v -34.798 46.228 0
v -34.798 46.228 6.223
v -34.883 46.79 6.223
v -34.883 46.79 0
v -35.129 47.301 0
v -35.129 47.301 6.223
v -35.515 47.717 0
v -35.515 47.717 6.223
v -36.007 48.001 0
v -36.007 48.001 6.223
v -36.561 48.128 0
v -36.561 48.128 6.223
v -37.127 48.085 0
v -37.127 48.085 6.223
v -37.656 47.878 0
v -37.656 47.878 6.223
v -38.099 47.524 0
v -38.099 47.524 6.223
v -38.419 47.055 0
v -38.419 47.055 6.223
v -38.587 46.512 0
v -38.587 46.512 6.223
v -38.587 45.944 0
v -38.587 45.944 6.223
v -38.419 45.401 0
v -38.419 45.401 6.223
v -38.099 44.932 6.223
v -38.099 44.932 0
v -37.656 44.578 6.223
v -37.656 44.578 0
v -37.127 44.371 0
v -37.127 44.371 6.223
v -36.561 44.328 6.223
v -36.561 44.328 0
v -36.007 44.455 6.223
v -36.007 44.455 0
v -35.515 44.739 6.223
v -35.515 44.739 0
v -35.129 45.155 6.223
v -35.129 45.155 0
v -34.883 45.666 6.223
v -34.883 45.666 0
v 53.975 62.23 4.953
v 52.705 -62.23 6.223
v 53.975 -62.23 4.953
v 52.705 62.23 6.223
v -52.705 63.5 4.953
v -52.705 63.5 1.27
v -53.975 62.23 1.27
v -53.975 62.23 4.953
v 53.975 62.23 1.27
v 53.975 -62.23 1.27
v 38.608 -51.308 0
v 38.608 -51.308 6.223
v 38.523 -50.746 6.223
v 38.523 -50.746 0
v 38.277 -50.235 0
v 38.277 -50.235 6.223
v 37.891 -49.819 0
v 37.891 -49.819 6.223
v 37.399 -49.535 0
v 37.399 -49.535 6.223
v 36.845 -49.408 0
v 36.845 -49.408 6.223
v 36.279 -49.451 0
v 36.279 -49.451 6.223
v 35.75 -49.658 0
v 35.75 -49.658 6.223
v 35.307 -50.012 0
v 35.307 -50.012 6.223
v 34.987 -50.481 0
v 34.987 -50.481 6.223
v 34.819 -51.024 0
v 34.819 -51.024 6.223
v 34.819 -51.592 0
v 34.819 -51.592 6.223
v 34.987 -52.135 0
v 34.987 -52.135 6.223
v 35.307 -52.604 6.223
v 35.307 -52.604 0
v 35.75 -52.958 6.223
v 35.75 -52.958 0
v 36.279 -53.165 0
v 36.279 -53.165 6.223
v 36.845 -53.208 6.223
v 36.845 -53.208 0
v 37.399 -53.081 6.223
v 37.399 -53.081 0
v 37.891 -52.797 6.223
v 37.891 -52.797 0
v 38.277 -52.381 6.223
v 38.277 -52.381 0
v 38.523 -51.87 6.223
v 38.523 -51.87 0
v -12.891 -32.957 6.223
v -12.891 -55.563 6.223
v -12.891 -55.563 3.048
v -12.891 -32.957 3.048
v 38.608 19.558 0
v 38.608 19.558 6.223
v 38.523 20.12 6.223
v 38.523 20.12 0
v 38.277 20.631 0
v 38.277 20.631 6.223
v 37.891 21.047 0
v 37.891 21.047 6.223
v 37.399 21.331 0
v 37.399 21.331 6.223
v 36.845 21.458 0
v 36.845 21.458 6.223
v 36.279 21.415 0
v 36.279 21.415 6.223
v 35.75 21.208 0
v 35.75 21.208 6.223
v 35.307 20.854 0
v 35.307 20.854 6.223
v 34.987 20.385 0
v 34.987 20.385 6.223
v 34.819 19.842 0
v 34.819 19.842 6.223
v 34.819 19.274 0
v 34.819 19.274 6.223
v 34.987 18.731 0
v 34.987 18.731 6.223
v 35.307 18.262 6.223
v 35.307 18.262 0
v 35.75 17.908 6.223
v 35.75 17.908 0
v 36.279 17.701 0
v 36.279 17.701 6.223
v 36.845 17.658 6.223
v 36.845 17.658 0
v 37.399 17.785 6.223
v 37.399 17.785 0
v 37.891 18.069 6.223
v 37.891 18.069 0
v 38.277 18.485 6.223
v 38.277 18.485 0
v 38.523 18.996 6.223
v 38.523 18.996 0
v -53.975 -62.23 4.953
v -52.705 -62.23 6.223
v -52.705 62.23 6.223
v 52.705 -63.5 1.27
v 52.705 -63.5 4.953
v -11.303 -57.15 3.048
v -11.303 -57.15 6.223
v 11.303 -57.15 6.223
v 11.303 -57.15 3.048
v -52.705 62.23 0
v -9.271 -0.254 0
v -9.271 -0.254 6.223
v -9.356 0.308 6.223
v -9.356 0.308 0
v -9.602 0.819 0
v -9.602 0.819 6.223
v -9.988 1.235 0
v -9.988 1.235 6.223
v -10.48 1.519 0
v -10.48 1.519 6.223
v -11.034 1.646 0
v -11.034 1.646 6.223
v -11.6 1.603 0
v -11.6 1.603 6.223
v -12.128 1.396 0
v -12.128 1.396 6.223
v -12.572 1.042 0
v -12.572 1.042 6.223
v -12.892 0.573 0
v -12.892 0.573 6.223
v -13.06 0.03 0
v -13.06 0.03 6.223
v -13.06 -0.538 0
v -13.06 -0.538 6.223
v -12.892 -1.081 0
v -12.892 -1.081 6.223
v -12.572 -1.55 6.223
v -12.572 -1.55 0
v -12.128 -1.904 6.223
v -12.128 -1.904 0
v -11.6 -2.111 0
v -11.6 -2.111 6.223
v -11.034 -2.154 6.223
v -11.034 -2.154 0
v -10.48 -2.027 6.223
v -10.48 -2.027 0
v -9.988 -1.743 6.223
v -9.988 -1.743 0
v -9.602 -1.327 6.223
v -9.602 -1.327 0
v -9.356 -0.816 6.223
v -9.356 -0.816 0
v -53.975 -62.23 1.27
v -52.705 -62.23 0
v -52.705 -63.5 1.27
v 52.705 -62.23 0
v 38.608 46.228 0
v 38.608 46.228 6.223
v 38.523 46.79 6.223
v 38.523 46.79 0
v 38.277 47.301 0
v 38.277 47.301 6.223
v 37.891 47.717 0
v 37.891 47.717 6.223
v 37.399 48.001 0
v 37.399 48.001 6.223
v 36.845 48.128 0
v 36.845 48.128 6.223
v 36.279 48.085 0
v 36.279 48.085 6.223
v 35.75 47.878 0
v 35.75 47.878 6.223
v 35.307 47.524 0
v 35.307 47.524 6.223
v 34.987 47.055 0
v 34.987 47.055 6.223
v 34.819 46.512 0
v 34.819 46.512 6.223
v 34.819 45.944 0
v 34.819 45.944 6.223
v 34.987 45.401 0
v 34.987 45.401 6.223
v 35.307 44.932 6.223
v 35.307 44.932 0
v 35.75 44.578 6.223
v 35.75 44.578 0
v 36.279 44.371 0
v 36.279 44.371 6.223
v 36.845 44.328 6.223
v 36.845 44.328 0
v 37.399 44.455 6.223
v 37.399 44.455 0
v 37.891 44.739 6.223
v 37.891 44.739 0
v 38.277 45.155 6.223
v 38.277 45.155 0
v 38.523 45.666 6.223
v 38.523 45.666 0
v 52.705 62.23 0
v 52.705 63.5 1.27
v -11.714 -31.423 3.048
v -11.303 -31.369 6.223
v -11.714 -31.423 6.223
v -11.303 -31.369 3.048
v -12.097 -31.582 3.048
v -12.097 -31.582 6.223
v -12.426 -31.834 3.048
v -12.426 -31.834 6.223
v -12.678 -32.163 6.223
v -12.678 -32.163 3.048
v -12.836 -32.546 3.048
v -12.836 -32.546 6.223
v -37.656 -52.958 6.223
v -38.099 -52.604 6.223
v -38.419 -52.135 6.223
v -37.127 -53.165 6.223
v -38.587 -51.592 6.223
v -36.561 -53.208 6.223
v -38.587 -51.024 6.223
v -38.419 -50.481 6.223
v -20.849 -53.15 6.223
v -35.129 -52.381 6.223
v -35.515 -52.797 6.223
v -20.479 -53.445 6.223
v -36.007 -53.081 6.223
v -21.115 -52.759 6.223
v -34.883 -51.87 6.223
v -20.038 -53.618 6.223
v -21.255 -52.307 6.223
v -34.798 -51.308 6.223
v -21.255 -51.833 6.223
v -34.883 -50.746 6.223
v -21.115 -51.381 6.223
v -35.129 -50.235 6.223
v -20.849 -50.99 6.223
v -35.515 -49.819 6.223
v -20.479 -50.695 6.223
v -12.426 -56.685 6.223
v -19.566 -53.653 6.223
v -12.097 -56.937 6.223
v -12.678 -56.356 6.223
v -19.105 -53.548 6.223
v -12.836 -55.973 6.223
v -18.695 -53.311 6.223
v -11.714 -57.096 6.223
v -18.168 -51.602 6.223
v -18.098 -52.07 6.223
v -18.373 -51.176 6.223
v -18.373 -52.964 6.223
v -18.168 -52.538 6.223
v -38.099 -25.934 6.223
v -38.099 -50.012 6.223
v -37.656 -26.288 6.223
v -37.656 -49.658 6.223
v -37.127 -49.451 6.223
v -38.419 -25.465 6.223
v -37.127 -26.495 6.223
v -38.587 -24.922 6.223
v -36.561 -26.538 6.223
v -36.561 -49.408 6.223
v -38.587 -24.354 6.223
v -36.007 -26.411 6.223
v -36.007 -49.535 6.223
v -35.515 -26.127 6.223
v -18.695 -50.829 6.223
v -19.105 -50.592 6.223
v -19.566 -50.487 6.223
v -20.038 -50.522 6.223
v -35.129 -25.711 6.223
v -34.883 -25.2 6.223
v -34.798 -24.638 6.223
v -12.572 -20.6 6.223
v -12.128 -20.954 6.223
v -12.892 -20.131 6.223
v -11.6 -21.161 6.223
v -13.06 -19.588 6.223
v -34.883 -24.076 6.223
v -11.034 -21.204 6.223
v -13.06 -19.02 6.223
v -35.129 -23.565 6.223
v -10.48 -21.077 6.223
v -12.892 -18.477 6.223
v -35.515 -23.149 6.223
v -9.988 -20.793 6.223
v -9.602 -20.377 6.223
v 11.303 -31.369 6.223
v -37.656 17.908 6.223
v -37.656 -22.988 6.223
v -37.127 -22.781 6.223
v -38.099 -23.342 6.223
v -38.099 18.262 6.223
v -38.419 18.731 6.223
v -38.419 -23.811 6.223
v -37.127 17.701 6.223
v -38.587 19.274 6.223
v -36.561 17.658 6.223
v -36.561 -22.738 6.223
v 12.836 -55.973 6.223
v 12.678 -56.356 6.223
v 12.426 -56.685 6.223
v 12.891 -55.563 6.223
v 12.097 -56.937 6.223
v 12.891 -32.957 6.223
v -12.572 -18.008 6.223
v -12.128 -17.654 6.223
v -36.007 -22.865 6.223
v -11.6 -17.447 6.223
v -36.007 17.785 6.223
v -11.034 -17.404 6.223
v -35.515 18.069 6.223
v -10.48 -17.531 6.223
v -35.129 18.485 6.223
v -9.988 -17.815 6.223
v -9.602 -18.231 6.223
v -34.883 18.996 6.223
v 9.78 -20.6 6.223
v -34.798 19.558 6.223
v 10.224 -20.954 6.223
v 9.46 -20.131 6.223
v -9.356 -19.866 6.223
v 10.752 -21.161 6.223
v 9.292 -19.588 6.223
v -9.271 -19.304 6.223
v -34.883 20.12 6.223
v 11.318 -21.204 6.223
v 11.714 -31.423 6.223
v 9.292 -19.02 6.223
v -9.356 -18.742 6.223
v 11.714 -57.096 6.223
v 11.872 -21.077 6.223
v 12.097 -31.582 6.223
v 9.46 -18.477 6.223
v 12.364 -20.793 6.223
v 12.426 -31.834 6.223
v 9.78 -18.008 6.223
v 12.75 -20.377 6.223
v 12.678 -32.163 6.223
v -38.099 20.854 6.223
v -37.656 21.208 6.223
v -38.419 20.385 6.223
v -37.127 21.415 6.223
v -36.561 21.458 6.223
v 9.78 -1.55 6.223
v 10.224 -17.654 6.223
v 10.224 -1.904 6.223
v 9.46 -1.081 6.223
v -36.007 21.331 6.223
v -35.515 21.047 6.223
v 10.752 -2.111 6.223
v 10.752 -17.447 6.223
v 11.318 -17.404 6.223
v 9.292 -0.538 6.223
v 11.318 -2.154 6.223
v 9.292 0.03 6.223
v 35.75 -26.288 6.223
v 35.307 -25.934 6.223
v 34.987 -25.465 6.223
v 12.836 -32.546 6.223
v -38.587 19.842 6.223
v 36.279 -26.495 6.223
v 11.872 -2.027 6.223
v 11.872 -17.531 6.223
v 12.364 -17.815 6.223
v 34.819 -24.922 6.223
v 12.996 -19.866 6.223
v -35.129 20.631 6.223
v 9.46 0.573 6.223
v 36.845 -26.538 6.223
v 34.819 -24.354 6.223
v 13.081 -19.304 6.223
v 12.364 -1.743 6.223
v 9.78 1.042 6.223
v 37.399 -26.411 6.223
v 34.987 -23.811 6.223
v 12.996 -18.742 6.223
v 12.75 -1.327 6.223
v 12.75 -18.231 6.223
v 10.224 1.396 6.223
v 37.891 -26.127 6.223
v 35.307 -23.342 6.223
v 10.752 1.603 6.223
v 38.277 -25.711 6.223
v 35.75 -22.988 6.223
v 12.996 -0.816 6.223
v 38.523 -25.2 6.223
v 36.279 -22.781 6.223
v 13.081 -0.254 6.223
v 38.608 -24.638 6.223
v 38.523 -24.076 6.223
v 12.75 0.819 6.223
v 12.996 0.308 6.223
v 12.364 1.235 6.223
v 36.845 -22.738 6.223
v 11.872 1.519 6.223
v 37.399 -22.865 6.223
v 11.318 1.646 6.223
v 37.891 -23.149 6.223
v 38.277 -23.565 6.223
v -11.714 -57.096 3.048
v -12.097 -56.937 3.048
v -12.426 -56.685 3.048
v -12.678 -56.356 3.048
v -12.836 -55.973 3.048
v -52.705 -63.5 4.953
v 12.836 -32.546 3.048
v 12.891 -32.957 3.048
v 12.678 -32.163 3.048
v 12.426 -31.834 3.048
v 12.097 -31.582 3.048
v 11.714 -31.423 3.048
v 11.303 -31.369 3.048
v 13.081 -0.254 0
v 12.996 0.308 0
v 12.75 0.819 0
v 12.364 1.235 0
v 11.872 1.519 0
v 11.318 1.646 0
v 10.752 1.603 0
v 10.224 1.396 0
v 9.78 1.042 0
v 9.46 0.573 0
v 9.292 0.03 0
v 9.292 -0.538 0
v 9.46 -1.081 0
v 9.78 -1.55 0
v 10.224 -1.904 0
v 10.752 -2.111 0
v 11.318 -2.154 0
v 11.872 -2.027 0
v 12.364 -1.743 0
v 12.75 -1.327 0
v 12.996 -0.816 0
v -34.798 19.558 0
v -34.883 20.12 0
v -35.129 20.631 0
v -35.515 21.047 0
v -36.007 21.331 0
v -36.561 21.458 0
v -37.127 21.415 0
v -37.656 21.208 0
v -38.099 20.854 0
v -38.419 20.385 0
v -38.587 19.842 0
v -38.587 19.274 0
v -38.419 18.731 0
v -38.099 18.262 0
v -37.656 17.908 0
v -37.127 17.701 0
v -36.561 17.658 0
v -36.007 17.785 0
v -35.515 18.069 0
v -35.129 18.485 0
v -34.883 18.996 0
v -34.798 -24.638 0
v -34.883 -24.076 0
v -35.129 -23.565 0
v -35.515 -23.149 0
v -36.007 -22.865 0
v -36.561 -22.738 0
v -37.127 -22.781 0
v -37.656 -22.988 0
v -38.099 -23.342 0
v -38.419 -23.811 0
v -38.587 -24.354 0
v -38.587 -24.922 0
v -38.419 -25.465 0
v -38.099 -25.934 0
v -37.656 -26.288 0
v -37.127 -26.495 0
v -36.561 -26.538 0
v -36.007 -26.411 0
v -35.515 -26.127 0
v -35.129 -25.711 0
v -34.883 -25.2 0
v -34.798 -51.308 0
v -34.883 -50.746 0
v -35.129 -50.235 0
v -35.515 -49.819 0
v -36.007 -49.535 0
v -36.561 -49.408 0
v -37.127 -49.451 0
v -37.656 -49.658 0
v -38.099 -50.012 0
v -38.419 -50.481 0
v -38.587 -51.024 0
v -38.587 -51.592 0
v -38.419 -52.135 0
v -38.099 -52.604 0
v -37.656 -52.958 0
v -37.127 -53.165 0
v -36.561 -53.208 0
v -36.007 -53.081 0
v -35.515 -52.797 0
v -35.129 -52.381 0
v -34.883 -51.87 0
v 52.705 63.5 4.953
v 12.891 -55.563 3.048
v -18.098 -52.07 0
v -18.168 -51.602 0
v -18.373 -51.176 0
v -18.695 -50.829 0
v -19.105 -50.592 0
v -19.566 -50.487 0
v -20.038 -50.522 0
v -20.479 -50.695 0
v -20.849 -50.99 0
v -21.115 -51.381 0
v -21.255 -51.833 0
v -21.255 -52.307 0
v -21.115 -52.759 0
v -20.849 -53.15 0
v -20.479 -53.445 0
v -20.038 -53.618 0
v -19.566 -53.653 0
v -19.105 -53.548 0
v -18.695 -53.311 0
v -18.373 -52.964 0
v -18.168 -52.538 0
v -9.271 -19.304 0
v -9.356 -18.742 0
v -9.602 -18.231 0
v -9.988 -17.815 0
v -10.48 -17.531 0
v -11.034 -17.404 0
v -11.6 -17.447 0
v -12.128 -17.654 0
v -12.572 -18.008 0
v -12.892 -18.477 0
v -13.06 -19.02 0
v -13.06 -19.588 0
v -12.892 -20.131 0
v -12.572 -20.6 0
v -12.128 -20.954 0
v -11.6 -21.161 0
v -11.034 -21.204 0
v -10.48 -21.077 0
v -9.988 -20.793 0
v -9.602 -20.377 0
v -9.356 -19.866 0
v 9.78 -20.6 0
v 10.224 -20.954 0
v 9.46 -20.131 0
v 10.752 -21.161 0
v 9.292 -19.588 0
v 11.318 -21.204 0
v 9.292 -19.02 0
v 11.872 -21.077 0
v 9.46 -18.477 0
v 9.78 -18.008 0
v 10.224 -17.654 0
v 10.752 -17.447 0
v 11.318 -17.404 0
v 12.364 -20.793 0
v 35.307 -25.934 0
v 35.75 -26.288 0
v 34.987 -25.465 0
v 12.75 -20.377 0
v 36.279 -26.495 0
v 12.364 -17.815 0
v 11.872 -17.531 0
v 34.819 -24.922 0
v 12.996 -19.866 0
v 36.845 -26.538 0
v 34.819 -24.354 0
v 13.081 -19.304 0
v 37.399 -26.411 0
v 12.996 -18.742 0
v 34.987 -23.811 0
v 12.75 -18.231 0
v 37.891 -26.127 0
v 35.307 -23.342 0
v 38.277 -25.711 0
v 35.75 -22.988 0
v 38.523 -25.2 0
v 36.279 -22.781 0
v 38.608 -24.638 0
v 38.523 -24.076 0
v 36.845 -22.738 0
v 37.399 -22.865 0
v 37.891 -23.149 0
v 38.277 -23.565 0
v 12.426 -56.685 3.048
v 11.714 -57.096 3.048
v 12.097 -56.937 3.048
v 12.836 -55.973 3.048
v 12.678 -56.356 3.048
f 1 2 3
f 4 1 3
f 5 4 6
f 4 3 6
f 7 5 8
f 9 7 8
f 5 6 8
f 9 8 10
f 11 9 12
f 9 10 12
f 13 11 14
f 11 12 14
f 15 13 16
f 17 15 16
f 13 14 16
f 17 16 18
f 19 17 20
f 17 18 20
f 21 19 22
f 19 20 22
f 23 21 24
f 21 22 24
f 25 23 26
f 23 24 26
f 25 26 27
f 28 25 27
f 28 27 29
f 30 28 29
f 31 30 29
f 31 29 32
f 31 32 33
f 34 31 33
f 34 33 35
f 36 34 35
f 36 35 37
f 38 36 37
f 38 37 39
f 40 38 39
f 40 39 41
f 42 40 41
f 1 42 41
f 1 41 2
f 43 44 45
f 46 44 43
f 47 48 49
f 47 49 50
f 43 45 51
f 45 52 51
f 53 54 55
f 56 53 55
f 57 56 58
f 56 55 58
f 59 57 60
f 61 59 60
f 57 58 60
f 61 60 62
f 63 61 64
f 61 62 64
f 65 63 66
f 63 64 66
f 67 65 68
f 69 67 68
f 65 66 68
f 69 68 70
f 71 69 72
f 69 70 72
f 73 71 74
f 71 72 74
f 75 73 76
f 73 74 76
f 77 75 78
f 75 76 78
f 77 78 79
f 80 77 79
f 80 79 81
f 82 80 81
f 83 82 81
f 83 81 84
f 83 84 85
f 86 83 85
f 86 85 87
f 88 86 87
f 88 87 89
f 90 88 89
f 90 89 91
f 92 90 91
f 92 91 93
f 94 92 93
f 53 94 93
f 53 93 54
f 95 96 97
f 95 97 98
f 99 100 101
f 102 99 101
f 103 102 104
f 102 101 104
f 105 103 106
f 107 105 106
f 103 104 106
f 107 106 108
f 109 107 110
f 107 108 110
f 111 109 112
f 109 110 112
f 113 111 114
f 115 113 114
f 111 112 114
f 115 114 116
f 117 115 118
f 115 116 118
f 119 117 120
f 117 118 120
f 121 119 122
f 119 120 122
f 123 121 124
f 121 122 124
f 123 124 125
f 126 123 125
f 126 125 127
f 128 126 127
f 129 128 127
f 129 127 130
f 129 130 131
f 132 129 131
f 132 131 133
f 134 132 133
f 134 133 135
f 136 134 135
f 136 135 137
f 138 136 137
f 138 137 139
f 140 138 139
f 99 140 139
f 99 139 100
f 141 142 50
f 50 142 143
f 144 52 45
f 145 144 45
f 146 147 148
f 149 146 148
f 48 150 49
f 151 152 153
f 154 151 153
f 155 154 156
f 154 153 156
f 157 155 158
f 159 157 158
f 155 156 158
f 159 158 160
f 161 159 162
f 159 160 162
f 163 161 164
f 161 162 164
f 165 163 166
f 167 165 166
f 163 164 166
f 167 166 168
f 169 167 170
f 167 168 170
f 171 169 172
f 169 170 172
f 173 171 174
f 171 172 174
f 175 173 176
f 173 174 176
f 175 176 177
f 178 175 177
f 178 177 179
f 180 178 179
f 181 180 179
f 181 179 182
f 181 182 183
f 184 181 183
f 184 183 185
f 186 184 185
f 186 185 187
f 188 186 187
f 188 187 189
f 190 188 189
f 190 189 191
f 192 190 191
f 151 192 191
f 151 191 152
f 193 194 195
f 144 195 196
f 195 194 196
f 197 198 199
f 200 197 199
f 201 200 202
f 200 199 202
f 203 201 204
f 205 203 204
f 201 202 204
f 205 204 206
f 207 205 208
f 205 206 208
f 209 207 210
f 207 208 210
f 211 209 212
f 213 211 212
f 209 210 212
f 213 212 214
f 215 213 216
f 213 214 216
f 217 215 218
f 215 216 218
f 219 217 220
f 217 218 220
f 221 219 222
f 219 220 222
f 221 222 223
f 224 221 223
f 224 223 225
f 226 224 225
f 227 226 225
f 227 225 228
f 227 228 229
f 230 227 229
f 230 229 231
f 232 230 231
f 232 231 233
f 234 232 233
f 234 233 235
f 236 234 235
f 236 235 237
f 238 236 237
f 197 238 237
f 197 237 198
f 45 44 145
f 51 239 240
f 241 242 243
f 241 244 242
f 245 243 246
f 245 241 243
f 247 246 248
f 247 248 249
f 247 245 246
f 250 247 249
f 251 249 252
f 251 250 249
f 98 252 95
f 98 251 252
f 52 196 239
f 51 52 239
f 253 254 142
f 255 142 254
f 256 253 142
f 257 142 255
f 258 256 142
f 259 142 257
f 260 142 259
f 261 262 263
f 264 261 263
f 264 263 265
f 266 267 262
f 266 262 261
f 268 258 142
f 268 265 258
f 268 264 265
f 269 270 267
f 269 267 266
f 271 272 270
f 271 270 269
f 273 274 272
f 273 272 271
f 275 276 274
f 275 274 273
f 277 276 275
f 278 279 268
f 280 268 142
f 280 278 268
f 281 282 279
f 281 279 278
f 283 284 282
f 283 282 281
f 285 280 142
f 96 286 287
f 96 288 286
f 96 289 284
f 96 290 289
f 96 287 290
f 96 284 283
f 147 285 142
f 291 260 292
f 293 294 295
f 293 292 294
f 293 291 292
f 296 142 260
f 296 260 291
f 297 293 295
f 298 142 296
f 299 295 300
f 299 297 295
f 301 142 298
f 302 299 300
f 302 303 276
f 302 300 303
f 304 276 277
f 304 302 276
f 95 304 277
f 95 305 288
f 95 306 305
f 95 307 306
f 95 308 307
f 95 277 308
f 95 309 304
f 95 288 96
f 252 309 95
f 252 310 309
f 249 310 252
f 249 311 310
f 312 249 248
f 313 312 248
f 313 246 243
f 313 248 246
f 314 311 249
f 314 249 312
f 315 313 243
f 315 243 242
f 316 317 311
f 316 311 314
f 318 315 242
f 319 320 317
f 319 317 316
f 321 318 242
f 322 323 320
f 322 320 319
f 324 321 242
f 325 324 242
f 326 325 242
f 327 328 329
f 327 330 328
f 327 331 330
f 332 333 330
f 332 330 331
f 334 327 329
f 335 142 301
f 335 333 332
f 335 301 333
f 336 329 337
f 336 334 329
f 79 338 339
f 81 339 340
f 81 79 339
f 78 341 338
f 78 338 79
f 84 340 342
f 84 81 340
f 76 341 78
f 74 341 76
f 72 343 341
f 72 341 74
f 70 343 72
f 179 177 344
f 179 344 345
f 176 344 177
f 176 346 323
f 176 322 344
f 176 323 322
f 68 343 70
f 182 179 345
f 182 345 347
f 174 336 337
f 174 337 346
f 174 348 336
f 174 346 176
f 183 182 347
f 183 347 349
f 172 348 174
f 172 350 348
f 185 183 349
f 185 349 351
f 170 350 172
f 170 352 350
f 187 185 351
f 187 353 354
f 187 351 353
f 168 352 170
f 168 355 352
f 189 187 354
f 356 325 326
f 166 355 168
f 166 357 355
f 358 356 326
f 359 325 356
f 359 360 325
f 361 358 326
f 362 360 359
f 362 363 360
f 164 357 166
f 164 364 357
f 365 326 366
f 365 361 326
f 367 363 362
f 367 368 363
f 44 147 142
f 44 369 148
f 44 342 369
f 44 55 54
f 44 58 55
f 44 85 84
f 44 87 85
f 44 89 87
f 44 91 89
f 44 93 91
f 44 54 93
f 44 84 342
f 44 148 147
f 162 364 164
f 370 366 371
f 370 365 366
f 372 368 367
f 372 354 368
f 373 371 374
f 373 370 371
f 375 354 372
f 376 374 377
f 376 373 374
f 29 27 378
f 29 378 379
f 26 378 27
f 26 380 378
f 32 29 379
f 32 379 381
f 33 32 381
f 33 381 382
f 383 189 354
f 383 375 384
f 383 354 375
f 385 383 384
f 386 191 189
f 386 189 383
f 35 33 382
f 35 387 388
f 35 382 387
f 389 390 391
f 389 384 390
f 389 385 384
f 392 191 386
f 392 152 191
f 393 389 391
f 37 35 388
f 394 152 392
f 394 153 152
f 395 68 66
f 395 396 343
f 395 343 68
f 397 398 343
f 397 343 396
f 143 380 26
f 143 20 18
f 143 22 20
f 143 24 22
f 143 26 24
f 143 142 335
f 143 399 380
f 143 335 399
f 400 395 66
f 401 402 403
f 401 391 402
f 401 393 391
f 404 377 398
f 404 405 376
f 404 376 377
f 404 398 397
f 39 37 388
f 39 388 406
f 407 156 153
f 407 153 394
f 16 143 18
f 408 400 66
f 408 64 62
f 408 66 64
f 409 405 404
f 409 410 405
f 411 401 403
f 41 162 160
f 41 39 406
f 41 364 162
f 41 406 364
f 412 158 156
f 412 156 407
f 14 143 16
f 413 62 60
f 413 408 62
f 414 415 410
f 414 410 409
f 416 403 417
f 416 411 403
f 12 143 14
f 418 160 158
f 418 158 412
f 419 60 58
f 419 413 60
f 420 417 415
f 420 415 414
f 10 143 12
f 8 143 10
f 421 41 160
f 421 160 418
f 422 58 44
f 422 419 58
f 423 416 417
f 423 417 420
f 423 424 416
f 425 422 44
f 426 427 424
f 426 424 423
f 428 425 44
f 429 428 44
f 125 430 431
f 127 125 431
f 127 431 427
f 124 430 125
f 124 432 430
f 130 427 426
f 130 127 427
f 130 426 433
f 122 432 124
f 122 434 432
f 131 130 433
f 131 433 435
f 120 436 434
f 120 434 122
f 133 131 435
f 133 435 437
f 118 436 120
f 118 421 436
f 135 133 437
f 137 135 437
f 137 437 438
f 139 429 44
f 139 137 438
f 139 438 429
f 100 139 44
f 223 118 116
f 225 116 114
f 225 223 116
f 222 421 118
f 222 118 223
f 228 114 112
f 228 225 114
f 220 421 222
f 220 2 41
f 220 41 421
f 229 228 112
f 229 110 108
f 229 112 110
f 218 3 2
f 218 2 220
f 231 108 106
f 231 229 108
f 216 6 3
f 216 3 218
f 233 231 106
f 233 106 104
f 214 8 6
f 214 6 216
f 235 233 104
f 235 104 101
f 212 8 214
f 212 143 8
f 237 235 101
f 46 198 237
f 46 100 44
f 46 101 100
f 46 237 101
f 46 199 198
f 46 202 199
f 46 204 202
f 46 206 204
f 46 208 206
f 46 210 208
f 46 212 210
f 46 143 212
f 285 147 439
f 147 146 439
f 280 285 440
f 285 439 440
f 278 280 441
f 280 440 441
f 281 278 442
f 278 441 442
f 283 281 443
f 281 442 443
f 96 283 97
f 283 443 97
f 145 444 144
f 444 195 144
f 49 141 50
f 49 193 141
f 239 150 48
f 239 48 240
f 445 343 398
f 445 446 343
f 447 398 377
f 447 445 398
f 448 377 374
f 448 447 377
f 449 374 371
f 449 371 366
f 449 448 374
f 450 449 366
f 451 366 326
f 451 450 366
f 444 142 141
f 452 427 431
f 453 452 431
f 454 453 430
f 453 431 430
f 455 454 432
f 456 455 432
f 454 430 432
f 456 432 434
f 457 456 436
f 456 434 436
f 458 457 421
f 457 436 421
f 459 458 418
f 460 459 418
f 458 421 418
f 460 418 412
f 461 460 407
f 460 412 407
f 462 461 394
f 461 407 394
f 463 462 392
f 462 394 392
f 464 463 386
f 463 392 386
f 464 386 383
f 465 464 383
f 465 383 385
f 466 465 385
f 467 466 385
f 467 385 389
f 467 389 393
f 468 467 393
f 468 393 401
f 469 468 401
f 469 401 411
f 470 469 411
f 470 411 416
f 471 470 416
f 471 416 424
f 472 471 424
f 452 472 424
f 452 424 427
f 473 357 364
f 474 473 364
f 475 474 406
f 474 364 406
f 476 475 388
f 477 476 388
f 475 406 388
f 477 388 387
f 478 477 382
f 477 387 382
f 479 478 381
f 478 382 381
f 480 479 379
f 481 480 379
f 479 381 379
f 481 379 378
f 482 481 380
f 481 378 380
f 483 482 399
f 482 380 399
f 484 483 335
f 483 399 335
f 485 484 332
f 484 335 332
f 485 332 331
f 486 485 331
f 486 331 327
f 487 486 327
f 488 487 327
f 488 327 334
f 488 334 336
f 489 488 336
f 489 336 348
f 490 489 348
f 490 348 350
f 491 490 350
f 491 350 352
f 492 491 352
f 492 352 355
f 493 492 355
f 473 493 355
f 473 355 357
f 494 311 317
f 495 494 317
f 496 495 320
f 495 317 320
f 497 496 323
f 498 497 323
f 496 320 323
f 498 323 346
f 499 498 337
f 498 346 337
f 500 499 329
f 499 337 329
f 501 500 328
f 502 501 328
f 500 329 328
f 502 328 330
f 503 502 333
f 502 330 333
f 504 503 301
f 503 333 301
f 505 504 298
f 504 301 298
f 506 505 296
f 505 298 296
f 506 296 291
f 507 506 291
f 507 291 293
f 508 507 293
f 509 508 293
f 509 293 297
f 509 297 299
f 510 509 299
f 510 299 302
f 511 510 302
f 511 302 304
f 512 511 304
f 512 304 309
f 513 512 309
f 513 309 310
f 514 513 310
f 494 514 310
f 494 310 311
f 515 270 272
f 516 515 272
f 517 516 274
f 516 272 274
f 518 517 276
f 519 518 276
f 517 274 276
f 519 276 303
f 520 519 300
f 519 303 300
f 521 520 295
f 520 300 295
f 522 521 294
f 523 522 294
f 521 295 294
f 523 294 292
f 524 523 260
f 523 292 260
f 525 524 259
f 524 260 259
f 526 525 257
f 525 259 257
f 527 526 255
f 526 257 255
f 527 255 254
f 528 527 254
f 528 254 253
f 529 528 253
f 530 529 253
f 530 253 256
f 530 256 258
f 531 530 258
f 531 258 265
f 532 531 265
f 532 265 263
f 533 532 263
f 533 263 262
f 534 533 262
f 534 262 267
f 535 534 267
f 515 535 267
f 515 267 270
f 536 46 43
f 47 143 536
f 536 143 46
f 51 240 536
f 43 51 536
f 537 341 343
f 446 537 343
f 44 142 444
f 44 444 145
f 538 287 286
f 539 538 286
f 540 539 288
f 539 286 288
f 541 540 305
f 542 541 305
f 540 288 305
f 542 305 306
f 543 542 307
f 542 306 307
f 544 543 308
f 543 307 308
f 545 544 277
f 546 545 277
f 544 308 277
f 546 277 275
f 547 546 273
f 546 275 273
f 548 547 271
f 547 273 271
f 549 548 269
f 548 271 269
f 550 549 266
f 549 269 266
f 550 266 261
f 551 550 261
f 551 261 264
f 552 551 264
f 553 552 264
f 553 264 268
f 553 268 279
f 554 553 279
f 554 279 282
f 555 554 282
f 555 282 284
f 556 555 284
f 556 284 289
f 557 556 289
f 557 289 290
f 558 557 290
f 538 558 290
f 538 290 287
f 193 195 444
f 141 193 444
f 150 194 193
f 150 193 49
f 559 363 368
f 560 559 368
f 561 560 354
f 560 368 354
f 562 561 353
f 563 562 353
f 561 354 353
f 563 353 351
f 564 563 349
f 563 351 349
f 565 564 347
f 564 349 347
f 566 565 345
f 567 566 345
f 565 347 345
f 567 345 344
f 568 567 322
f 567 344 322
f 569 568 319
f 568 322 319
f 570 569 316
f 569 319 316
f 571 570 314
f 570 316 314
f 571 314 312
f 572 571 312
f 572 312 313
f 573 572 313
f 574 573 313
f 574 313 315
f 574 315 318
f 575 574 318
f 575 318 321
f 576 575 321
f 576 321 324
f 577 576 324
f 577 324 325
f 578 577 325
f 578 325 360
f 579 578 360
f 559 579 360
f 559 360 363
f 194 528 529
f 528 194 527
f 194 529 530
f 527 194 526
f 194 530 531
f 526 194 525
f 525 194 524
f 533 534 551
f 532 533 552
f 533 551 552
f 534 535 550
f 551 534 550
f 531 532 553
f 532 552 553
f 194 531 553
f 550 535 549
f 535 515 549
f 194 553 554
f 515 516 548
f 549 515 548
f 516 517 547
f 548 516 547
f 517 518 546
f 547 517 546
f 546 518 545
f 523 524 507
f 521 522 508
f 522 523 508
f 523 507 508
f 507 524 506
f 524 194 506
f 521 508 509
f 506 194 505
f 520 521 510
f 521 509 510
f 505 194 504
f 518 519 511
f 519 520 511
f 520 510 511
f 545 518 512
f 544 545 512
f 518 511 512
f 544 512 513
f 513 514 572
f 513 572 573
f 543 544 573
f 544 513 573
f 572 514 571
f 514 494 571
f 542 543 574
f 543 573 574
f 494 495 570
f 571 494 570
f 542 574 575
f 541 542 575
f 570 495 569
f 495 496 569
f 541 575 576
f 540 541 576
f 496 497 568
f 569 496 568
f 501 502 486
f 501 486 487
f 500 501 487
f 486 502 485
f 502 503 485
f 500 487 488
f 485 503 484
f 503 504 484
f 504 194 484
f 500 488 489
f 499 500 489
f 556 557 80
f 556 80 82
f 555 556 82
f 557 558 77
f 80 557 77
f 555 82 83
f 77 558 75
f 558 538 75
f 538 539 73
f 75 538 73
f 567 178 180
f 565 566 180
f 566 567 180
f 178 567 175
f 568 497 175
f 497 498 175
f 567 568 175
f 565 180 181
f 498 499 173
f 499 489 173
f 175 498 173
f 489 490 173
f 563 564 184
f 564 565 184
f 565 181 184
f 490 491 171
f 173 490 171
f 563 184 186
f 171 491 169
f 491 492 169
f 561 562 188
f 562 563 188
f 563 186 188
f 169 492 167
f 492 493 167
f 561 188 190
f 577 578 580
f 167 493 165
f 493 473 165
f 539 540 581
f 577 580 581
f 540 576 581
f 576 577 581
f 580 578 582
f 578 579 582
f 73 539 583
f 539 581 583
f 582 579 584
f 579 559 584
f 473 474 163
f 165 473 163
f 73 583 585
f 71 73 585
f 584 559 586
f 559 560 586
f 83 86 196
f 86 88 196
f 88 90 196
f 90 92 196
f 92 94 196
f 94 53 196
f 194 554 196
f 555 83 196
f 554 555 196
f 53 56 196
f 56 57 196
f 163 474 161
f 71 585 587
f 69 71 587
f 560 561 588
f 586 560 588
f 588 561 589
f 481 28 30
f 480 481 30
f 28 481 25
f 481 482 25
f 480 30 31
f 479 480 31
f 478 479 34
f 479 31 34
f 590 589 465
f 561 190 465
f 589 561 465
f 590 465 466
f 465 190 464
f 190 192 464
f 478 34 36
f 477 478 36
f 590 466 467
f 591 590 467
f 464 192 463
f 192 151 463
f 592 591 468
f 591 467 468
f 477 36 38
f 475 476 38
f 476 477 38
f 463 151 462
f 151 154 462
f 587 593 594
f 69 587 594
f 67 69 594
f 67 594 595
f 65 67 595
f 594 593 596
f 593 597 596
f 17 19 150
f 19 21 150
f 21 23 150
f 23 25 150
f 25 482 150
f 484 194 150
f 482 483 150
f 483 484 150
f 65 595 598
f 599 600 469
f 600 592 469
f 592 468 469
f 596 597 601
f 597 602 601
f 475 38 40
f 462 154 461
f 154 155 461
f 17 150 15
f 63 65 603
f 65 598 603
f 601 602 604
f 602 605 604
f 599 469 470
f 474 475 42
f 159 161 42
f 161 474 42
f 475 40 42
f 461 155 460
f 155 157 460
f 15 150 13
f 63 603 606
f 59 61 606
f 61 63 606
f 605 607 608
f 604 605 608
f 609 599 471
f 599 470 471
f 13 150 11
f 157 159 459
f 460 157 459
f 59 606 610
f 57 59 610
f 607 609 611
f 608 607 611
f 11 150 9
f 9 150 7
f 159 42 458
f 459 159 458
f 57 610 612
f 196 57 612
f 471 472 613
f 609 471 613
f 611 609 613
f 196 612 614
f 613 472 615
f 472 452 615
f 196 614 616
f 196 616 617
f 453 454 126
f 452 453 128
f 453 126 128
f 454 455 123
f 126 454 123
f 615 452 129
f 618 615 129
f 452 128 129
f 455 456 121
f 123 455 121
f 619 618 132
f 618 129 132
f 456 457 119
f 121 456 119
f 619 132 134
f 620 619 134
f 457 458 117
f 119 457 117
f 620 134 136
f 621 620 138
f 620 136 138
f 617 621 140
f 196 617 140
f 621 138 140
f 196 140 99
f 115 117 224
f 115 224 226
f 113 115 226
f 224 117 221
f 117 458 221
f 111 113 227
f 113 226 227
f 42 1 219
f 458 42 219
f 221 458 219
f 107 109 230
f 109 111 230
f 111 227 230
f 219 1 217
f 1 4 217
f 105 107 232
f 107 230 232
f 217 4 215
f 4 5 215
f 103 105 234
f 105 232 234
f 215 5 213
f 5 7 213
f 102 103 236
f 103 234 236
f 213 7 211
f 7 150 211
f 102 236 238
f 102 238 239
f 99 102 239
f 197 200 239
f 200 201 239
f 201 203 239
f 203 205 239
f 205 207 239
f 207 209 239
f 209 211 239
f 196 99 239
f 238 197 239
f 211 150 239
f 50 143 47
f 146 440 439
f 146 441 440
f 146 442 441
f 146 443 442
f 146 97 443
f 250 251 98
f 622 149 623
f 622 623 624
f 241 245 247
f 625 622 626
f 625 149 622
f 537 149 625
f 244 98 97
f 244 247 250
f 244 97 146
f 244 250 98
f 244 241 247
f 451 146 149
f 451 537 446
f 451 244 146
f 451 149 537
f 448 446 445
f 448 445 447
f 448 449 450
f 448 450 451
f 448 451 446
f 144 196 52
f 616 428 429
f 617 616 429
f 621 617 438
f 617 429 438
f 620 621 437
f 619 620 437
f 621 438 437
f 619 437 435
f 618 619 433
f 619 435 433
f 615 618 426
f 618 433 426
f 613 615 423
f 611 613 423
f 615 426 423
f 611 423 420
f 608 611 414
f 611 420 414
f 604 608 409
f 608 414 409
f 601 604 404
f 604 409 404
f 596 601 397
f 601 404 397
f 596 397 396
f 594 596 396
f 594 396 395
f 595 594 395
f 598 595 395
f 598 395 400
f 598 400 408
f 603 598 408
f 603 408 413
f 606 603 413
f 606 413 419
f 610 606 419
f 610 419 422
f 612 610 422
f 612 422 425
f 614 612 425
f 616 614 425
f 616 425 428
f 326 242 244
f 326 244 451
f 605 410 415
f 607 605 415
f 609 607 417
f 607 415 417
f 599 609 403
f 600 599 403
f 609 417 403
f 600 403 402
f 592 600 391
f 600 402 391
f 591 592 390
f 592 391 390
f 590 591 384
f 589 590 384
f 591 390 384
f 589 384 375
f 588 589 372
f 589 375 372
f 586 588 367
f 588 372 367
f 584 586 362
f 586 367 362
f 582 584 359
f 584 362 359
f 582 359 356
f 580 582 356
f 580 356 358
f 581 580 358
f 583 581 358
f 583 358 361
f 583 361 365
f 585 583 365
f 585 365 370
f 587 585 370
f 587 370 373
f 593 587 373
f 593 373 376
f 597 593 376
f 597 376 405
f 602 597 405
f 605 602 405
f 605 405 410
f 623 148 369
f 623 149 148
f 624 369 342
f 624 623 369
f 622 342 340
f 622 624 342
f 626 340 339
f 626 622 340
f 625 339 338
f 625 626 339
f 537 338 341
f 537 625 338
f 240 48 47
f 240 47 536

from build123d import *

# Parameters (mm, degrees)
SKETCH1_W           = 107.95
SKETCH1_H           = 127
BOSS_EXTRUDE1_DEPTH = 6.223
CHAMFER1_SIZE       = 1.27
SKETCH2_R           = 1.905
CUT_EXTRUDE1_DEPTH  = 7.223
SKETCH3_R           = 1.905
CUT_EXTRUDE2_DEPTH  = 7.223
SKETCH4_W           = 25.781
SKETCH4_H           = 25.781
CUT_EXTRUDE3_DEPTH  = 3.175
FILLET1_R           = 1.5875
SKETCH5_R           = 1.5875
CUT_EXTRUDE4_DEPTH  = 7.223


with BuildPart() as part:
    # Sketch1 → Boss-Extrude1 (new body)
    with BuildSketch(Plane.XY):
        Rectangle(SKETCH1_W, SKETCH1_H)
    extrude(amount=BOSS_EXTRUDE1_DEPTH)

    # Chamfer1
    chamfer1_edges = [part.edges().sort_by_distance(p)[0] for p in [
        (-53.975, 0, 6.223),
        (0, -63.5, 6.223),
        (53.975, 0, 6.223),
        (0, -63.5, 0),
        (-53.975, 0, 0),
        (0, 63.5, 0),
        (53.975, 0, 0),
        (0, 63.5, 6.223),
        (53.975, -63.5, 3.1115),
        (-53.975, -63.5, 3.1115),
        (-53.975, 63.5, 3.1115),
        (53.975, 63.5, 3.1115),
    ]]
    chamfer(chamfer1_edges, length=CHAMFER1_SIZE)

    # Sketch2 → Cut-Extrude1 (cut, through all)
    with BuildSketch(Plane.XY.offset(6.223)):
        with Locations((-36.703, 46.228)):
            Circle(SKETCH2_R)
        with Locations((-36.703, -51.308)):
            Circle(SKETCH2_R)
        with Locations((36.703, -51.308)):
            Circle(SKETCH2_R)
        with Locations((36.703, 46.228)):
            Circle(SKETCH2_R)
        with Locations((-36.703, 19.558)):
            Circle(SKETCH2_R)
        with Locations((-36.703, -24.638)):
            Circle(SKETCH2_R)
        with Locations((36.703, 19.558)):
            Circle(SKETCH2_R)
        with Locations((36.703, -24.638)):
            Circle(SKETCH2_R)
    extrude(amount=-CUT_EXTRUDE1_DEPTH, mode=Mode.SUBTRACT)

    # Sketch3 → Cut-Extrude2 (cut, through all)
    with BuildSketch(Plane.XY.offset(6.223)):
        with Locations((-11.176, -0.254)):
            Circle(SKETCH3_R)
        with Locations((11.176, -0.254)):
            Circle(SKETCH3_R)
        with Locations((11.176, -19.304)):
            Circle(SKETCH3_R)
        with Locations((-11.176, -19.304)):
            Circle(SKETCH3_R)
    extrude(amount=-CUT_EXTRUDE2_DEPTH, mode=Mode.SUBTRACT)

    # Sketch4 → Cut-Extrude3 (cut)
    with BuildSketch(Plane.XY.offset(6.223)):
        with Locations((0, -44.2595)):
            Rectangle(SKETCH4_W, SKETCH4_H)
    extrude(amount=-CUT_EXTRUDE3_DEPTH, mode=Mode.SUBTRACT)

    # Fillet1
    fillet1_edges = [part.edges().sort_by_distance(p)[0] for p in [
        (12.8905, -31.369, 4.6355),
        (12.8905, -57.15, 4.6355),
        (-12.8905, -57.15, 4.6355),
        (-12.8905, -31.369, 4.6355),
    ]]
    fillet(fillet1_edges, radius=FILLET1_R)

    # Sketch5 → Cut-Extrude4 (cut, through all)
    with BuildSketch(Plane.XY.offset(6.223)):
        with Locations((-19.685, -52.07)):
            Circle(SKETCH5_R)
    extrude(amount=-CUT_EXTRUDE4_DEPTH, mode=Mode.SUBTRACT)


solid = part.part
